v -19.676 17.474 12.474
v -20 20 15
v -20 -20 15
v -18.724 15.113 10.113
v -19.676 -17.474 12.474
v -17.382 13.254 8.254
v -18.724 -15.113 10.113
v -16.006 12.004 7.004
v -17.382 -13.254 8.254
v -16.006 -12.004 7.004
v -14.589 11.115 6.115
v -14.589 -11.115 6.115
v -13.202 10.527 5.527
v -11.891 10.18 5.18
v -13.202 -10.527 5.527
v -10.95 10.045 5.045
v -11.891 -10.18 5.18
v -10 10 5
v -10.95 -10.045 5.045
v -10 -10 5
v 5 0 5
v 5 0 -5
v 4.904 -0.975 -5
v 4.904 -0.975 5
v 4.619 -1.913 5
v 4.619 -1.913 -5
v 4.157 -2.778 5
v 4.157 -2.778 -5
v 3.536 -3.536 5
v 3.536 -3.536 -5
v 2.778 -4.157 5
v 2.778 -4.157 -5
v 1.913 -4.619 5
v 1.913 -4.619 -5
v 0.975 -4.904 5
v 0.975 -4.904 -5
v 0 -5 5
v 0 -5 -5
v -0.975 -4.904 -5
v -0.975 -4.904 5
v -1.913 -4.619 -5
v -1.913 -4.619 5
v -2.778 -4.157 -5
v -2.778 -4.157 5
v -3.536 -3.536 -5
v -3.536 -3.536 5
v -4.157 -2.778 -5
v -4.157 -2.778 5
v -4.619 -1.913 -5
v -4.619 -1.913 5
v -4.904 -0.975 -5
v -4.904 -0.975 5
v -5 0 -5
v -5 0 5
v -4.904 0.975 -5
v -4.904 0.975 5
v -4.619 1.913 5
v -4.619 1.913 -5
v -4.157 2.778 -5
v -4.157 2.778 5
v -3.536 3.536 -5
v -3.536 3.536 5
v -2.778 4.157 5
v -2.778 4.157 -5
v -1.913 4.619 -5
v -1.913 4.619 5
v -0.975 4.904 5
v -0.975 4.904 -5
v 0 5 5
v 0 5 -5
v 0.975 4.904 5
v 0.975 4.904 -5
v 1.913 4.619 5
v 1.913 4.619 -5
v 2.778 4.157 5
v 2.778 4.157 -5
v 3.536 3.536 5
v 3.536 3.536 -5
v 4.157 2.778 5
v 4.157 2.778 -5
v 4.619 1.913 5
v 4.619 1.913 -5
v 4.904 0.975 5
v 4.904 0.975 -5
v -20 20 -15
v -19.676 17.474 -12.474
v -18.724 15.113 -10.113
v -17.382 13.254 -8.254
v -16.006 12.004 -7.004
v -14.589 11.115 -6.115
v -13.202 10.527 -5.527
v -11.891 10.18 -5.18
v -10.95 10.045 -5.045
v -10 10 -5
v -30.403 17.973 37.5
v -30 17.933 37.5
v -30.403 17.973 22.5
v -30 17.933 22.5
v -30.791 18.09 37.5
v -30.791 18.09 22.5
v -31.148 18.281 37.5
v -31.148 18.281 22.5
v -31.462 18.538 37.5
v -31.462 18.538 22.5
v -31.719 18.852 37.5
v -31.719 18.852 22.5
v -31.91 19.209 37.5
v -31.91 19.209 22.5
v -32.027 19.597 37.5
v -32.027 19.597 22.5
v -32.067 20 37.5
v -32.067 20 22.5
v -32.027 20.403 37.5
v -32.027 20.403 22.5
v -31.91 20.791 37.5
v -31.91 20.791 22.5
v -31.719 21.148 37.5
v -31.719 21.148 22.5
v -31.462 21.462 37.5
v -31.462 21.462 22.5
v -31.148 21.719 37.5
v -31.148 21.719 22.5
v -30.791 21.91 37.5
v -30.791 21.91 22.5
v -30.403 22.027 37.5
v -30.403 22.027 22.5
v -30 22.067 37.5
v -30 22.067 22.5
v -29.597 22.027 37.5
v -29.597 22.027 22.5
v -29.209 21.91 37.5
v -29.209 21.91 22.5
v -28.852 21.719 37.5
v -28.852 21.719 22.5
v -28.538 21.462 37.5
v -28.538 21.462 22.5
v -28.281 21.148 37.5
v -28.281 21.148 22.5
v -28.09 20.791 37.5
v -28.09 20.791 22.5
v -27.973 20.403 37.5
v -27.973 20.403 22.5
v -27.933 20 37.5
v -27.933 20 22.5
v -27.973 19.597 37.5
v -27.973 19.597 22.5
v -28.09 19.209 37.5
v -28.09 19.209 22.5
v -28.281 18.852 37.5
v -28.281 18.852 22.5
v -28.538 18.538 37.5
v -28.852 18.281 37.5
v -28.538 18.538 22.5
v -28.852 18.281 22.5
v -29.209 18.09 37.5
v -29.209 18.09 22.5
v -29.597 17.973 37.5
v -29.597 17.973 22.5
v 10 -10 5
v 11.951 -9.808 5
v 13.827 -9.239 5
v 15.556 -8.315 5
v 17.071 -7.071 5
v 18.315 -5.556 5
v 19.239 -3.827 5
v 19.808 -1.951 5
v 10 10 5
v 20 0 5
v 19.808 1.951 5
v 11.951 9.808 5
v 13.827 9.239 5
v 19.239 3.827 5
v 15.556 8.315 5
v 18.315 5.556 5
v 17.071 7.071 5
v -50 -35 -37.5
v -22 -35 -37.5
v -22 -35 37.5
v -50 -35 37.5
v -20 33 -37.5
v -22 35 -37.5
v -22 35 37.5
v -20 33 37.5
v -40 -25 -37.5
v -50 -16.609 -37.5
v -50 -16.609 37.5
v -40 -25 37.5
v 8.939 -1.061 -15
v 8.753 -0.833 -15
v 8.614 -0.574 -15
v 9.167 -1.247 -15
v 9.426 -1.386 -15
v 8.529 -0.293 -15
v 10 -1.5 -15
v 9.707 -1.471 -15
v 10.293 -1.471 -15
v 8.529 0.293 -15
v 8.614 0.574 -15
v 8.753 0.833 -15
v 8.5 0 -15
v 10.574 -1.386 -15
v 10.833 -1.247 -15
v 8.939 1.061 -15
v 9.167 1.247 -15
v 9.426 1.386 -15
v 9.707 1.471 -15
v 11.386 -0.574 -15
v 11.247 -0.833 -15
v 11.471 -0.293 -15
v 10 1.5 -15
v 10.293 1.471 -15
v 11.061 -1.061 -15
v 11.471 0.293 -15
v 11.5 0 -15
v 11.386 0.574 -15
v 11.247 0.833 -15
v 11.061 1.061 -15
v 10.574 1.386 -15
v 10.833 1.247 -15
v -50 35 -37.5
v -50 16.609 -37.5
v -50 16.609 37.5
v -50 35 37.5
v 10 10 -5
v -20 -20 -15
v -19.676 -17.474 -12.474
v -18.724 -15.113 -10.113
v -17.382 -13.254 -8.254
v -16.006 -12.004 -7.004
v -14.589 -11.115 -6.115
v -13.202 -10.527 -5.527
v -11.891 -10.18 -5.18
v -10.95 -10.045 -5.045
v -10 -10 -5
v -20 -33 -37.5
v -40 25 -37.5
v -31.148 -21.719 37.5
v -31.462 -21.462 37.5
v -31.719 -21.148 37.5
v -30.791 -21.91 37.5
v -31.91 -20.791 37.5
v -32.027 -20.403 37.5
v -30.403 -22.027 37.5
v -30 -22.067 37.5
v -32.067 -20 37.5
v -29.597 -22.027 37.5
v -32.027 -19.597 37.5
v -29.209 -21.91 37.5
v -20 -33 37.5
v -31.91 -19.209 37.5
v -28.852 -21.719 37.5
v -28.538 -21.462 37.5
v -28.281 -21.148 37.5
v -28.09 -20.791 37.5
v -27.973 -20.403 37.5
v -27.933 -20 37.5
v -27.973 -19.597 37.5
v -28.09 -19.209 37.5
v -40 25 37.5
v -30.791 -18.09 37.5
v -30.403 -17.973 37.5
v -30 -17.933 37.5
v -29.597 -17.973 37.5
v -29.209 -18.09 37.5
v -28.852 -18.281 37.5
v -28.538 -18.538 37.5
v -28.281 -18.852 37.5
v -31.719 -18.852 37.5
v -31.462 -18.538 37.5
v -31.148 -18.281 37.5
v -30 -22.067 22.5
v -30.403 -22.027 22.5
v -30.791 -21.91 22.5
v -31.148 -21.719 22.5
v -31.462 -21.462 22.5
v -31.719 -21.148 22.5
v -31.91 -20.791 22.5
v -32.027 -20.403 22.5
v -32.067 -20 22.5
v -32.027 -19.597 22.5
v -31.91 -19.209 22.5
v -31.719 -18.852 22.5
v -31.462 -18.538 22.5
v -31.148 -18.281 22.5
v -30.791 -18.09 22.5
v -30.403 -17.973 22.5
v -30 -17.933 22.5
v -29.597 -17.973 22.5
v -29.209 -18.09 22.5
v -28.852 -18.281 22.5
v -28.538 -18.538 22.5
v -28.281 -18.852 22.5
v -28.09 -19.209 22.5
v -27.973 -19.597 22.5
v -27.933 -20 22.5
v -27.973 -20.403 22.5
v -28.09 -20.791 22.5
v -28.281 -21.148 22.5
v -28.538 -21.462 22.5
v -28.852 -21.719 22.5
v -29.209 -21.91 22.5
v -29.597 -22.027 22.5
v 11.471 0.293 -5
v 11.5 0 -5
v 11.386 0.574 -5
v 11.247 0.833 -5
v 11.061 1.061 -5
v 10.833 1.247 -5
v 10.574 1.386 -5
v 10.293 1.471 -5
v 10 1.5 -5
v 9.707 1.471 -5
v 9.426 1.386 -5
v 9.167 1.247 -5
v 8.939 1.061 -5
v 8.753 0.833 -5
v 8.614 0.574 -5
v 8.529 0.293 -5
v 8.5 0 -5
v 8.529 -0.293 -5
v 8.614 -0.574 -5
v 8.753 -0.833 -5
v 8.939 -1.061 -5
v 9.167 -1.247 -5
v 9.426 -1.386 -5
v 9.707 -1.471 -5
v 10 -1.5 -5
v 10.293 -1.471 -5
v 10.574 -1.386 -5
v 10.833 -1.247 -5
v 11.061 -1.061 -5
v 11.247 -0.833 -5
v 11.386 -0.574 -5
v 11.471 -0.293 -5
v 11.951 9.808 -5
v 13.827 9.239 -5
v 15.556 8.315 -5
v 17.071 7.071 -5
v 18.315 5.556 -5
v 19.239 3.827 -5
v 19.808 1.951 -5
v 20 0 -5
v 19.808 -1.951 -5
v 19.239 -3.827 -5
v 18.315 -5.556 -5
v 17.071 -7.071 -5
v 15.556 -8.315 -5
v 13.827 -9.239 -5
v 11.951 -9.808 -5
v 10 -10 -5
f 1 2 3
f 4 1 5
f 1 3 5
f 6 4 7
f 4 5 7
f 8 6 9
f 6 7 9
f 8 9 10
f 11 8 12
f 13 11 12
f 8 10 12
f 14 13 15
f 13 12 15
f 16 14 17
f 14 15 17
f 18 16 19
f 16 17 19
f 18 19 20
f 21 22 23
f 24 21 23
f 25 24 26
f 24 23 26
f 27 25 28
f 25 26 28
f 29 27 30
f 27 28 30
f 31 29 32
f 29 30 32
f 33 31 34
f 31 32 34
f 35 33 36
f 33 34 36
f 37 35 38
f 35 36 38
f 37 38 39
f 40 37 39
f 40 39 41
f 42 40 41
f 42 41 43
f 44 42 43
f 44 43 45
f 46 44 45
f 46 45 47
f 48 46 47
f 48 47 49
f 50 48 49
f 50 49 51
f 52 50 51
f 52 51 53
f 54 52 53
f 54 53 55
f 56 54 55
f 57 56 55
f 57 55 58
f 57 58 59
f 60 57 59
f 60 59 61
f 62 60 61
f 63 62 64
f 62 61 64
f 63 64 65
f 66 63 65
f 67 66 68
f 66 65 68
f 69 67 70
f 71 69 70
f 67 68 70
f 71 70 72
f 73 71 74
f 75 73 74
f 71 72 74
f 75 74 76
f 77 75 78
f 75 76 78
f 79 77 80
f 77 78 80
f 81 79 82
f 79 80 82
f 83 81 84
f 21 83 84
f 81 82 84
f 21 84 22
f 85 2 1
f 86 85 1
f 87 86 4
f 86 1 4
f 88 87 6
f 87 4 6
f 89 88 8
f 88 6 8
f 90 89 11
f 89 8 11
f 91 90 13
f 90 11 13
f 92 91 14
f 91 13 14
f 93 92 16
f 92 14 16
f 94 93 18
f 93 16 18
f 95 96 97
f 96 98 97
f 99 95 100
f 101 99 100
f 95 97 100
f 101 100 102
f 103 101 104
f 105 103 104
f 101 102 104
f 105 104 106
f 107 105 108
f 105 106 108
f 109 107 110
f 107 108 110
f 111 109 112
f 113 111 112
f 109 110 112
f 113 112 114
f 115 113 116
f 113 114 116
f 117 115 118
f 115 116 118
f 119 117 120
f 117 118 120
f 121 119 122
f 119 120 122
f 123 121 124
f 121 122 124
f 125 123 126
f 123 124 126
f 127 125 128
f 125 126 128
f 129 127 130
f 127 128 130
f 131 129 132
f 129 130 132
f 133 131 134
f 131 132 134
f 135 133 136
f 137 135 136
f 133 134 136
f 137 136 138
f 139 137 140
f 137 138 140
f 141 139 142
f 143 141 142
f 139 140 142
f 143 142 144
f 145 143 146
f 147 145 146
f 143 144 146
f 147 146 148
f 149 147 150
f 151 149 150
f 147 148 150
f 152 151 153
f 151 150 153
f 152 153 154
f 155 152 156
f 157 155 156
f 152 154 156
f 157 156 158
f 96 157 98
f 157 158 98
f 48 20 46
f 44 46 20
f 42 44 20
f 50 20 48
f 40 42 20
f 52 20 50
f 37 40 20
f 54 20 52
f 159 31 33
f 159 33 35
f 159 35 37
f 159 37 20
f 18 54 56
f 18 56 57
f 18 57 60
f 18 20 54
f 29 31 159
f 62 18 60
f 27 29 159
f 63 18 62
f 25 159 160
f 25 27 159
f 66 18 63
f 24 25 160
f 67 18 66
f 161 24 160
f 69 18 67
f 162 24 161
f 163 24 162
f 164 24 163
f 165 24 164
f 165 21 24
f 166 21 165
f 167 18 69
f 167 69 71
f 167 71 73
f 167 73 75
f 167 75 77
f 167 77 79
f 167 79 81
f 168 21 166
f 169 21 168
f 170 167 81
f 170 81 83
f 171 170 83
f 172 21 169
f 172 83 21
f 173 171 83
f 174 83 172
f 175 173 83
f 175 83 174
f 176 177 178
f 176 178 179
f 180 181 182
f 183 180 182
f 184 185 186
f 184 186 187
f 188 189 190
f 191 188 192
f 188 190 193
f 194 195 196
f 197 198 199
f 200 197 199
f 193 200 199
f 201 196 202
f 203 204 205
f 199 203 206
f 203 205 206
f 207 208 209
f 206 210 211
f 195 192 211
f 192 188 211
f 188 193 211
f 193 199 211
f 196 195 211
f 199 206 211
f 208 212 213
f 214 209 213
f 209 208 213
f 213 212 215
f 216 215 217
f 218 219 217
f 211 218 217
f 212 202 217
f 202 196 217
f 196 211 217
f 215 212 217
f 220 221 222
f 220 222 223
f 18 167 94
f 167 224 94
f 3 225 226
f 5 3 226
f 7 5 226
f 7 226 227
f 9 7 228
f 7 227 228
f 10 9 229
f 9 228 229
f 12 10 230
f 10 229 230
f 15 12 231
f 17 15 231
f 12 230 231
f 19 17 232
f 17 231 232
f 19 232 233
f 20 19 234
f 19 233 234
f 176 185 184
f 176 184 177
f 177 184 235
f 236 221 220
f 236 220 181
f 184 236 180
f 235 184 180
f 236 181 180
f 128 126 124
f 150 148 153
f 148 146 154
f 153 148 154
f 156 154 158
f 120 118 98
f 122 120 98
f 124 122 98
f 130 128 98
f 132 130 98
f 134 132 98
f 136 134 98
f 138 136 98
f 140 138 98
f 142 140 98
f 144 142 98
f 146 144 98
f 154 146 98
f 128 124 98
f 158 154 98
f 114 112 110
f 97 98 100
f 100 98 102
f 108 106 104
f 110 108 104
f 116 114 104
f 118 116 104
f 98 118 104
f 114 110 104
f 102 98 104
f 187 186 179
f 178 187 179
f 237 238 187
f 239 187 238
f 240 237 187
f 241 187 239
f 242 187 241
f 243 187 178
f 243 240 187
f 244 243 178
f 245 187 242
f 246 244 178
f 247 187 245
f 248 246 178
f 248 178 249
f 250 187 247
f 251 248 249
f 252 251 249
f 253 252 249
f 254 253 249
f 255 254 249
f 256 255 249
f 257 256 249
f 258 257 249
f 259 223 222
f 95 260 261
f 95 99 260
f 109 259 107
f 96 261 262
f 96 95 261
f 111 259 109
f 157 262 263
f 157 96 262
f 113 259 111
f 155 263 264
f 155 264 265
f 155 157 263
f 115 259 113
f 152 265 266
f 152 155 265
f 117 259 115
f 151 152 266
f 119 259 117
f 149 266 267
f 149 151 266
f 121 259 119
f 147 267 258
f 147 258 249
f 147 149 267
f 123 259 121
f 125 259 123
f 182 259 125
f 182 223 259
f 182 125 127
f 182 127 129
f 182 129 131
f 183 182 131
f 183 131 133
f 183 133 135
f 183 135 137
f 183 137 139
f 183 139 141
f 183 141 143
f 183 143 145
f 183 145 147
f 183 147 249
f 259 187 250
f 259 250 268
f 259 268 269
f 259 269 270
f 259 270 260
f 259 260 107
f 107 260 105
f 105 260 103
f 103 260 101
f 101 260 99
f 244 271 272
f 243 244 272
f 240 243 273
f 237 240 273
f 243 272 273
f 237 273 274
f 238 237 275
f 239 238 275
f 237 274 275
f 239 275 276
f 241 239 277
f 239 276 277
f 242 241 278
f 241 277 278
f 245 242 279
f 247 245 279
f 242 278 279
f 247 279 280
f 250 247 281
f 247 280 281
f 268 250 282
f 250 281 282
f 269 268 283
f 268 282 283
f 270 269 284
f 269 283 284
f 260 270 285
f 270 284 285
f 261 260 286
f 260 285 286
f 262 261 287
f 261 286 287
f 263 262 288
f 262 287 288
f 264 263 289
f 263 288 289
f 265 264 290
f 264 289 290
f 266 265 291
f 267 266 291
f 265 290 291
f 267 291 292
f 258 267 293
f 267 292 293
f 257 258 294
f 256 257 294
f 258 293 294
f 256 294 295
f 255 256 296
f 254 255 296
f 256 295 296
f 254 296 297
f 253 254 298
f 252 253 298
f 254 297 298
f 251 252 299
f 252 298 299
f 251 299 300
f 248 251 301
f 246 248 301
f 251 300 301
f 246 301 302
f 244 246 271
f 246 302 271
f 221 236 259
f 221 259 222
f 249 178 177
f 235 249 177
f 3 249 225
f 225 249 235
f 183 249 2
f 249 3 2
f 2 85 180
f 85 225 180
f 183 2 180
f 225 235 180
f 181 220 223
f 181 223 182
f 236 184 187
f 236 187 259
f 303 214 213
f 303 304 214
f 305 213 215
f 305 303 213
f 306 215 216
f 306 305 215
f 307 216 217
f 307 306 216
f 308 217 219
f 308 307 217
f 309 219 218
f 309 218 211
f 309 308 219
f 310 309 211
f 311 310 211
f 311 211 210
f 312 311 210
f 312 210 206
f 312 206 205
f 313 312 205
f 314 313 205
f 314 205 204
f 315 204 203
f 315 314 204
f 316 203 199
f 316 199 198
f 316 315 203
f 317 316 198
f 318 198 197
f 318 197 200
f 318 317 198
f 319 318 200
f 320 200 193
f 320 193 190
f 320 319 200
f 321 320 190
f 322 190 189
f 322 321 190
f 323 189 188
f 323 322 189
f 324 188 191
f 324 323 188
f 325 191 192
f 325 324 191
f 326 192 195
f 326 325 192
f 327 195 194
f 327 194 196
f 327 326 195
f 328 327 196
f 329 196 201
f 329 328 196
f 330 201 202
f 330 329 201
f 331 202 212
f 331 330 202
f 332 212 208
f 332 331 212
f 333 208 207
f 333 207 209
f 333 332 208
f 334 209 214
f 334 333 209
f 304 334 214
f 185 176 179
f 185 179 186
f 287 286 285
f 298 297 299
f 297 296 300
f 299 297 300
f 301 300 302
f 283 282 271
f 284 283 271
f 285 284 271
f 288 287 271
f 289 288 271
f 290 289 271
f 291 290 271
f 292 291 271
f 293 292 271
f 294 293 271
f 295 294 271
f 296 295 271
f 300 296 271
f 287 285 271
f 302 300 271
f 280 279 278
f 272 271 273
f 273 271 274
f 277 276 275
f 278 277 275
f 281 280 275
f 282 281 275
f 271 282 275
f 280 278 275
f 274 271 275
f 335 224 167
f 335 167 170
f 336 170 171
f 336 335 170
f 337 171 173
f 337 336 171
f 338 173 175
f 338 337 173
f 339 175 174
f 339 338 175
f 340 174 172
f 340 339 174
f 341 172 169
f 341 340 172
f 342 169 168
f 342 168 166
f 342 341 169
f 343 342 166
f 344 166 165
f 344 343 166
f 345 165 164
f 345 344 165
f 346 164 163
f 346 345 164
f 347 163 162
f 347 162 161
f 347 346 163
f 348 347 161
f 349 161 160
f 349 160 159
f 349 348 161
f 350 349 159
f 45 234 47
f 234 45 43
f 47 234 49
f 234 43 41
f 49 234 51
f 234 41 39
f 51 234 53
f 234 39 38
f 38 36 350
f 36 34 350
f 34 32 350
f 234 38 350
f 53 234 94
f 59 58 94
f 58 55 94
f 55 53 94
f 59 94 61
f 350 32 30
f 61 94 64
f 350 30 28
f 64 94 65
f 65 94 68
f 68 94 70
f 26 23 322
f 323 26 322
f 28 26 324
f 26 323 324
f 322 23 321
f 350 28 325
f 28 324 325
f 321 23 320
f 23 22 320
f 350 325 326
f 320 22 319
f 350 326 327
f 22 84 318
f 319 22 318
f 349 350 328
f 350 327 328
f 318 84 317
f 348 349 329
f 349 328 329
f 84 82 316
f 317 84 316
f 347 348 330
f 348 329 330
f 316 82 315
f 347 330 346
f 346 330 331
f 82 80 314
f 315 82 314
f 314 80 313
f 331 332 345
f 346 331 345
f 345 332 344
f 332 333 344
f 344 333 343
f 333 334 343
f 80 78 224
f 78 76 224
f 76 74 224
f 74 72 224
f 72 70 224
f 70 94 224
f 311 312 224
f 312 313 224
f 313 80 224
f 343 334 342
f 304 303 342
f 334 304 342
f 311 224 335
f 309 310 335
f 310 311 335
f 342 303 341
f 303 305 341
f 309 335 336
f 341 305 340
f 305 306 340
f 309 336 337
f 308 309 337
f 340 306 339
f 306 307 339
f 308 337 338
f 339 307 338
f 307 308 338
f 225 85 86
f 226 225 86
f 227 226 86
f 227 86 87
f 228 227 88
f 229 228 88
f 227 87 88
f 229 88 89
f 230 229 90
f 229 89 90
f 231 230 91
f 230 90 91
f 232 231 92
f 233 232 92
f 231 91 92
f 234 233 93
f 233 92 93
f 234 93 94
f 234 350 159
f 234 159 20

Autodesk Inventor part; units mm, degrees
ref_plane "YZ Plane" through (0, 0, 0) normal (1, 0, 0) x (0, 1, 0)
ref_plane "XZ Plane" through (0, 0, 0) normal (0, 1, 0) x (-1, 0, 0)
ref_plane "XY Plane" through (0, 0, 0) normal (0, 0, 1) x (1, 0, 0)
sketch "Skizze3" plane through (0, 0, 0) normal (0, 0, 1) x (1, 0, 0)
  circle A0 centre (0, 0) radius 5
  circle A1 centre (10, 0) radius 1.5
  line L0 (0, -49) -> (0, 49) projected
  line L1 (-64, 0) -> (34, 0) projected
  arc A2 (10, -10) -> (10, 10) centre (10, 0) ccw
  line L2 (10, -10) -> (0, -10)
  line L3 (10, 10) -> (0, 10)
  arc A3 (0, 10) -> (0, -10) centre (0, 0) ccw
  line L4 (0, -10) -> (-20, -10)
  line L5 (0, 10) -> (-20, 10)
  line L6 (-20, -10) -> (-20, -35)
  line L7 (-20, -35) -> (-50, -35)
  line L8 (-50, -35) -> (-50, 35)
  line L9 (-50, 35) -> (-20, 35)
  line L10 (-20, 35) -> (-20, 10)
  line L11 (-50, -16.609) -> (-40, -25)
  line L12 (-40, -25) -> (-40, 25)
  line L13 (-40, 25) -> (-50, 16.609)
  line L14 (-20, -10) -> (-20, 10)
  point P0 (-10, 0)
  dimension "d5" = 10
  dimension "d6" = 3
  dimension "d7" = 10
  dimension "d8" = 20
  dimension "d10" = 10
  dimension "d11" = 50
  dimension "d12" = 30
  dimension "d13" = 20
  dimension "d15" = 25
  dimension "d16" = 25
  dimension "d17" = 10
  dimension "d19" = 50
extrude "Extrusion3" add sketch "Skizze3" along normal mid plane 10 contours L1 A1 A2 L2 L0 A0 | A0 L0 L3 A2 L1 A1 | A0 L1 A3 L0 | L0 A3 L1 A0 | L1 A1 | A1 L1 | A3 L1 L14 L5 | L4 L14 L1 A3
extrude "Extrusion4" add sketch "Skizze3" along normal mid plane 75 contours L14 L1 L12 L13 L8 L9 L10 | L6 L7 L8 L11 L12 L1 L14
chamfer "Fase1" distance 2 angle 45 2 edges at (-20, 35, 0) (-20, -35, 0)
fillet "Rundung1" radius 10 4 edges at (-20, 0, 5) (-20, -10, 0) (-20, 0, -5) (-20, 10, 0)
sketch "Skizze5" plane through (0, 0, 37.5) normal (0, 0, 1) x (1, 0, 0)
  line L0 (-50, -35) -> (-22, -35) projected
  line L1 (-20, -33) -> (-20, 33) projected
  line L2 (-22, 35) -> (-50, 35) projected
  point P0 (0, 0)
  point P1 (-30, 20)
  point P2 (-30, -20)
  dimension "d30" = 15
  dimension "d31" = 10
  dimension "d32" = 15
  dimension "d33" = 10
hole "Bohrung1" at (-30, 20, 37.5) at (-30, -20, 37.5) direction (0, 0, -1) diameter 4.134 depth 15 thread size "M5x0.8" class "6H" standard "ISO Metric profile"
extrude "Extrusion5" add sketch "Skizze3" against normal blind 15 contours L1 A1 | A1 L1
properties part number "BT401_trajan20_21" material "Kunststoff, undurchsichtig Schwarz"
